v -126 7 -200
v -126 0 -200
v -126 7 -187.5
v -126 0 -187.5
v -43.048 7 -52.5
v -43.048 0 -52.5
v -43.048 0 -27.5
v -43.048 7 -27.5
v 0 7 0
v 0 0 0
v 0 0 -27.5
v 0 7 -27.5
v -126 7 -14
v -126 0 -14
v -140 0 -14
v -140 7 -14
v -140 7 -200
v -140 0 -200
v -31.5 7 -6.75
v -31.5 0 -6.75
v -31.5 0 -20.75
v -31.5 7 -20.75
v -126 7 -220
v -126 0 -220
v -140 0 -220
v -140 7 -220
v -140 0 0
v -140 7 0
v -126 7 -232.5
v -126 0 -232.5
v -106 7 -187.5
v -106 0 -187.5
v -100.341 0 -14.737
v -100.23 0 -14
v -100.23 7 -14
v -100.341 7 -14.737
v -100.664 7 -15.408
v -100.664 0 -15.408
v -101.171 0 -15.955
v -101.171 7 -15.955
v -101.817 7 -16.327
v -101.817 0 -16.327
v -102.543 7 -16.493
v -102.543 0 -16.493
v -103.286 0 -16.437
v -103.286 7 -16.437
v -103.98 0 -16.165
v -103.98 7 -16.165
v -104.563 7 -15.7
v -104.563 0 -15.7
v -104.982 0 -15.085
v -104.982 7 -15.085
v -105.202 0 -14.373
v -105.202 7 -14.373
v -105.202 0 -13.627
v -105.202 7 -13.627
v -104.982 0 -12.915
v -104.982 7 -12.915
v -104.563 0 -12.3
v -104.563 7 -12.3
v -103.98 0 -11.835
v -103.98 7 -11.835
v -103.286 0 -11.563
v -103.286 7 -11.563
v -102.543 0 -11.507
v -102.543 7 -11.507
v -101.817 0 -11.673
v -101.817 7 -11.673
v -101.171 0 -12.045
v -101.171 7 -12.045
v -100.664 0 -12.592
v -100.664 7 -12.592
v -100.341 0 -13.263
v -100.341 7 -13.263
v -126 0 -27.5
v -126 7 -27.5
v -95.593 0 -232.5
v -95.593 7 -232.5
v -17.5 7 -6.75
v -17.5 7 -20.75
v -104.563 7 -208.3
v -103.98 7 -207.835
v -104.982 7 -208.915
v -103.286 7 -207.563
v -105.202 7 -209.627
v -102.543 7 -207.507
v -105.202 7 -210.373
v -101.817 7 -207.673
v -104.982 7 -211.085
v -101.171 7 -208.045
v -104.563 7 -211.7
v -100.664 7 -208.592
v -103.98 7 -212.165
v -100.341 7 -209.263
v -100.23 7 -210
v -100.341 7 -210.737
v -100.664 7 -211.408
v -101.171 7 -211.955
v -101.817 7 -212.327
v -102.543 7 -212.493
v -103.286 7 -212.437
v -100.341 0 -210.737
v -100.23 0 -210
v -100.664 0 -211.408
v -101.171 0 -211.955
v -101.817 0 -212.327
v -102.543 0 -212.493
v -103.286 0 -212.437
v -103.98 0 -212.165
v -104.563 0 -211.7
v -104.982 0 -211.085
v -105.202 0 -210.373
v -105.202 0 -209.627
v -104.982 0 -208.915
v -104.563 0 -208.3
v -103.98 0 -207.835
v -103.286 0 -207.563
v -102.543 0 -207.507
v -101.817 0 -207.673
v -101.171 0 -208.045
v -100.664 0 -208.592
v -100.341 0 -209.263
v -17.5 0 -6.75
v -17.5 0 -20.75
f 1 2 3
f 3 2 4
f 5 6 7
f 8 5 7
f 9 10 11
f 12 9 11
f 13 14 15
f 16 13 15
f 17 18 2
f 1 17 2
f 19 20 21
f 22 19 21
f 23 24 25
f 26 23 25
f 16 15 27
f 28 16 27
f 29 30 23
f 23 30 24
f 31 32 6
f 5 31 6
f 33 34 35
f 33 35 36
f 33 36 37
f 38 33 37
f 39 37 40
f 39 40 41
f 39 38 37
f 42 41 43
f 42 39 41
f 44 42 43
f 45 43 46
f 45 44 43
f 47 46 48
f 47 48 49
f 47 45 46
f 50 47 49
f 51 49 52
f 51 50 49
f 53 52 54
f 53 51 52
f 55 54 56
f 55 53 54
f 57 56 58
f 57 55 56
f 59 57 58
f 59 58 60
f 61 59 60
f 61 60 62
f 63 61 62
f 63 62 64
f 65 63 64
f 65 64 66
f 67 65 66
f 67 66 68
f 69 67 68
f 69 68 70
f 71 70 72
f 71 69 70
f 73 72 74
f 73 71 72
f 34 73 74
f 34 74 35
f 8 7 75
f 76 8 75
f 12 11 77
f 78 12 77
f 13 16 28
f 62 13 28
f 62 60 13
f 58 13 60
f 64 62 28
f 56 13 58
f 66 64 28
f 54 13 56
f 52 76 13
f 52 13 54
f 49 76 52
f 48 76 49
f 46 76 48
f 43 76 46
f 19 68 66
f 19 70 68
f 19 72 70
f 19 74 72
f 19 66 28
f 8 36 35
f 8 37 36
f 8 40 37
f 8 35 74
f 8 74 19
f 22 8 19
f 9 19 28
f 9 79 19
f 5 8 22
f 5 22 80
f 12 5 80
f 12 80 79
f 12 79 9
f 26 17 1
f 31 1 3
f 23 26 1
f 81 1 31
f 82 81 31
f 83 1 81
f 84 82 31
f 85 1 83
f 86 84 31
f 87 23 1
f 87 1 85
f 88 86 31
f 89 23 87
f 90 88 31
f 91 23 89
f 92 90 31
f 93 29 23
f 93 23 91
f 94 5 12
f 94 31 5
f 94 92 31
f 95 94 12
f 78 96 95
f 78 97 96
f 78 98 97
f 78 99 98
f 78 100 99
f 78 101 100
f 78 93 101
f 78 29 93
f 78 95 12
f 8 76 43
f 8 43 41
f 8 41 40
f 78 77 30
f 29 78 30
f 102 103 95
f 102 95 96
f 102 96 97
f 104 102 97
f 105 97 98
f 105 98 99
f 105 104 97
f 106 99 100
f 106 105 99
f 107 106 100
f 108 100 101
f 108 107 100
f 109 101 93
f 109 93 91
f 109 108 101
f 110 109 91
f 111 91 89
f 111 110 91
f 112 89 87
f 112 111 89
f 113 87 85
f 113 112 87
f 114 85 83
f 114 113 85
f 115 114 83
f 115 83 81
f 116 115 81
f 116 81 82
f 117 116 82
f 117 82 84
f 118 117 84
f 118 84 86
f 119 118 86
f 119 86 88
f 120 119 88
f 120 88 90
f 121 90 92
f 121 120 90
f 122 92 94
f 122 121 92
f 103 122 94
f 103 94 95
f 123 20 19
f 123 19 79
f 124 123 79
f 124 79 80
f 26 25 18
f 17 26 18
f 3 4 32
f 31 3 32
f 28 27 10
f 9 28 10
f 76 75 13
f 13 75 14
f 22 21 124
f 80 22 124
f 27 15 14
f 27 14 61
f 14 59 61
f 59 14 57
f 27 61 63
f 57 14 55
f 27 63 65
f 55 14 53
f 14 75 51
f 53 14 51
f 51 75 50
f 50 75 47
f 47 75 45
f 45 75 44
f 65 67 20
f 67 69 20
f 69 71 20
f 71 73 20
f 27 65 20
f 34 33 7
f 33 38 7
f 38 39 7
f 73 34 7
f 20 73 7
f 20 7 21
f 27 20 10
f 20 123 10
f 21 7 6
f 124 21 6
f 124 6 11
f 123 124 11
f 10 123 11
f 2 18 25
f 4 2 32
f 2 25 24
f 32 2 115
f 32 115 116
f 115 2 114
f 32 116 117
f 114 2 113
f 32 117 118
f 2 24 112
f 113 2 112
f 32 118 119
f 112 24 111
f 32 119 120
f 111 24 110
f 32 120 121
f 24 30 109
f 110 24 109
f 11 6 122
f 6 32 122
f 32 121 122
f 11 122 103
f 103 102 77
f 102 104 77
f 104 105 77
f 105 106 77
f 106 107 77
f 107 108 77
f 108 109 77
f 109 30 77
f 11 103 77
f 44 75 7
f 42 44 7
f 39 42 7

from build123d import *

# Parameters (mm, degrees)
SKETCH1_R           = 2.5
SKETCH1_W           = 14
SKETCH1_H           = 14
BOSS_EXTRUDE1_DEPTH = 7


with BuildPart() as part:
    # Sketch1 → Boss-Extrude1 (new body)
    with BuildSketch(Plane(origin=(0, 0, 0), x_dir=(1, 0, 0), z_dir=(0, 1, 0))):
        Polygon((0, 0), (0, 27.5), (-95.593069922, 232.5), (-126, 232.5), (-126, 220), (-140, 220), (-140, 200), (-126, 200), (-126, 187.5), (-106, 187.5), (-43.048466149, 52.5), (-43.048466149, 27.5), (-126, 27.5), (-126, 14), (-140, 14), (-140, 0), align=None)
        with Locations((-102.73, 14)):
            Circle(SKETCH1_R, mode=Mode.SUBTRACT)
        with Locations((-102.73, 210)):
            Circle(SKETCH1_R, mode=Mode.SUBTRACT)
        with Locations((-24.5, 13.75)):
            Rectangle(SKETCH1_W, SKETCH1_H, mode=Mode.SUBTRACT)
    extrude(amount=BOSS_EXTRUDE1_DEPTH)


solid = part.part
